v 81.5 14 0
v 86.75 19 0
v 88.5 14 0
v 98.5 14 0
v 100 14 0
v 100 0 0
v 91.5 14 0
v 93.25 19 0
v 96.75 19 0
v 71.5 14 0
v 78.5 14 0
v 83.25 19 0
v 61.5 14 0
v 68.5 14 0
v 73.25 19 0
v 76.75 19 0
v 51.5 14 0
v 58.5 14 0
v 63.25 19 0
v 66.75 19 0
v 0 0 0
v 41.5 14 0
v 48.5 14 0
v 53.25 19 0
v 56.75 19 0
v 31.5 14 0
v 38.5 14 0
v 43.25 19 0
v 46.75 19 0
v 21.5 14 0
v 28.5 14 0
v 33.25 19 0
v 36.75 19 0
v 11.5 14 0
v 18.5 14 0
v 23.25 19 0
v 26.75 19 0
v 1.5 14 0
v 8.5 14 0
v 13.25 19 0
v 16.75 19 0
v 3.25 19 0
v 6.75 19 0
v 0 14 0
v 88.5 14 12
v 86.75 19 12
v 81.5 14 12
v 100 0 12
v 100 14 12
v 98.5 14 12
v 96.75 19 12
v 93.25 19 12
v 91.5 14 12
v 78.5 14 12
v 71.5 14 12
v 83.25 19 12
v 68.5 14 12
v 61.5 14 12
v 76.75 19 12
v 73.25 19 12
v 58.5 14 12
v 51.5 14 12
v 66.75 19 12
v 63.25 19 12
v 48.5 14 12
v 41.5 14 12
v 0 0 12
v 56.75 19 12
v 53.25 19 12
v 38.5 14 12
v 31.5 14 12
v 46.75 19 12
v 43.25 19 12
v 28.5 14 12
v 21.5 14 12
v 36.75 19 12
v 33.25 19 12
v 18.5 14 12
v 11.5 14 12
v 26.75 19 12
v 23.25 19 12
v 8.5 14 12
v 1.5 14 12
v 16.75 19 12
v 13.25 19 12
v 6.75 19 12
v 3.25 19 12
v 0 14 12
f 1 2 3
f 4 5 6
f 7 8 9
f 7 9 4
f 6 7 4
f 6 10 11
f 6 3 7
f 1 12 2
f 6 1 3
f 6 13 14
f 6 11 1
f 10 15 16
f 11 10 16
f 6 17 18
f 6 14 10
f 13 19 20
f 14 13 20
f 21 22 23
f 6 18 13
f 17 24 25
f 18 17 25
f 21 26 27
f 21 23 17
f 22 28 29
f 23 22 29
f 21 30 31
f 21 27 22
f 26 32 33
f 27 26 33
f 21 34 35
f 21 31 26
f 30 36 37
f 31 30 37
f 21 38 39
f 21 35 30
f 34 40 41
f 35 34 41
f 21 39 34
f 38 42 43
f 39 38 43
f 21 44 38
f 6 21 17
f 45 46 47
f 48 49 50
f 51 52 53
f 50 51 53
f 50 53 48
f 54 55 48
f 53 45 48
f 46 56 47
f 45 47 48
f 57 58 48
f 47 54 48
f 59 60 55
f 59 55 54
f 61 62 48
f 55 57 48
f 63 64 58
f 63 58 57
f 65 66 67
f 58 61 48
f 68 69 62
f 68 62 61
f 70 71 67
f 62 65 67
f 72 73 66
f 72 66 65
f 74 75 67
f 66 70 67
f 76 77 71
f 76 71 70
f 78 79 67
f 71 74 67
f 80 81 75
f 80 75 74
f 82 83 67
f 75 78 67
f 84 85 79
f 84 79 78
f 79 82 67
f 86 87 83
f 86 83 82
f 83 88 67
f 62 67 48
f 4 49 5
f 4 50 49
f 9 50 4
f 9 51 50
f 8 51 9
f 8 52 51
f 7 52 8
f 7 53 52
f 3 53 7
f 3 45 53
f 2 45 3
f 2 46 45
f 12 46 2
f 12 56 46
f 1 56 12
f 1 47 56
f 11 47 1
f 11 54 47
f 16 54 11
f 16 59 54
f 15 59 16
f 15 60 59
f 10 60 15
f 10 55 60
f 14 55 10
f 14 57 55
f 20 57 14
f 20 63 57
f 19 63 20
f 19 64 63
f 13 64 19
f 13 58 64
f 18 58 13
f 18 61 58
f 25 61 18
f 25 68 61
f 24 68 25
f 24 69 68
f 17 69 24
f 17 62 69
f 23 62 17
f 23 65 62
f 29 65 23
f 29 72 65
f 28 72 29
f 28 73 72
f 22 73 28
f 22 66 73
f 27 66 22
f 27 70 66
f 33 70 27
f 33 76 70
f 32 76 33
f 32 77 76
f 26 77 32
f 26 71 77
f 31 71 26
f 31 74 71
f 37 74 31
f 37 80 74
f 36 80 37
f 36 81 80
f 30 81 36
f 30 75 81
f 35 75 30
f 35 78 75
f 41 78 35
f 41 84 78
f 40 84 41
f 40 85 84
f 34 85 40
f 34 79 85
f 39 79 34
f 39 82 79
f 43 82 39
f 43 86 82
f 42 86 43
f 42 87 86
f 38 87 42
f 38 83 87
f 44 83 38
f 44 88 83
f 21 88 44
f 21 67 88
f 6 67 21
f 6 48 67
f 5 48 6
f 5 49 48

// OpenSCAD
$fn = 32;

// ----------------------------------------------------------------------
// Gear rack: 10 teeth, pitch 10 mm
// ----------------------------------------------------------------------

// --- parameters (mm) ---
teeth = 10;               // number of teeth
pitch = 10;               // tooth pitch, X
root_w = 7;               // tooth width at the root
tip_w = 3.5;              // tooth width at the tip
base_h = 14;              // rack body height, Y
tooth_h = 5;              // tooth height above the body
plate_t = 12;             // rack width, Z (extrusion height)

rack_l = teeth * pitch;  // overall length
total_h = base_h + tooth_h;  // overall height

profile = [[0, 0], [100, 0], [100, 14], [98.5, 14], [96.75, 19], [93.25, 19], [91.5, 14], [88.5, 14], [86.75, 19], [83.25, 19], [81.5, 14], [78.5, 14], [76.75, 19], [73.25, 19], [71.5, 14], [68.5, 14], [66.75, 19], [63.25, 19], [61.5, 14], [58.5, 14], [56.75, 19], [53.25, 19], [51.5, 14], [48.5, 14], [46.75, 19], [43.25, 19], [41.5, 14], [38.5, 14], [36.75, 19], [33.25, 19], [31.5, 14], [28.5, 14], [26.75, 19], [23.25, 19], [21.5, 14], [18.5, 14], [16.75, 19], [13.25, 19], [11.5, 14], [8.5, 14], [6.75, 19], [3.25, 19], [1.5, 14], [0, 14]];  // primary outline, 44 points, counter clockwise

// --- the one profile operation ---
linear_extrude(height = plate_t) polygon(points = profile);
